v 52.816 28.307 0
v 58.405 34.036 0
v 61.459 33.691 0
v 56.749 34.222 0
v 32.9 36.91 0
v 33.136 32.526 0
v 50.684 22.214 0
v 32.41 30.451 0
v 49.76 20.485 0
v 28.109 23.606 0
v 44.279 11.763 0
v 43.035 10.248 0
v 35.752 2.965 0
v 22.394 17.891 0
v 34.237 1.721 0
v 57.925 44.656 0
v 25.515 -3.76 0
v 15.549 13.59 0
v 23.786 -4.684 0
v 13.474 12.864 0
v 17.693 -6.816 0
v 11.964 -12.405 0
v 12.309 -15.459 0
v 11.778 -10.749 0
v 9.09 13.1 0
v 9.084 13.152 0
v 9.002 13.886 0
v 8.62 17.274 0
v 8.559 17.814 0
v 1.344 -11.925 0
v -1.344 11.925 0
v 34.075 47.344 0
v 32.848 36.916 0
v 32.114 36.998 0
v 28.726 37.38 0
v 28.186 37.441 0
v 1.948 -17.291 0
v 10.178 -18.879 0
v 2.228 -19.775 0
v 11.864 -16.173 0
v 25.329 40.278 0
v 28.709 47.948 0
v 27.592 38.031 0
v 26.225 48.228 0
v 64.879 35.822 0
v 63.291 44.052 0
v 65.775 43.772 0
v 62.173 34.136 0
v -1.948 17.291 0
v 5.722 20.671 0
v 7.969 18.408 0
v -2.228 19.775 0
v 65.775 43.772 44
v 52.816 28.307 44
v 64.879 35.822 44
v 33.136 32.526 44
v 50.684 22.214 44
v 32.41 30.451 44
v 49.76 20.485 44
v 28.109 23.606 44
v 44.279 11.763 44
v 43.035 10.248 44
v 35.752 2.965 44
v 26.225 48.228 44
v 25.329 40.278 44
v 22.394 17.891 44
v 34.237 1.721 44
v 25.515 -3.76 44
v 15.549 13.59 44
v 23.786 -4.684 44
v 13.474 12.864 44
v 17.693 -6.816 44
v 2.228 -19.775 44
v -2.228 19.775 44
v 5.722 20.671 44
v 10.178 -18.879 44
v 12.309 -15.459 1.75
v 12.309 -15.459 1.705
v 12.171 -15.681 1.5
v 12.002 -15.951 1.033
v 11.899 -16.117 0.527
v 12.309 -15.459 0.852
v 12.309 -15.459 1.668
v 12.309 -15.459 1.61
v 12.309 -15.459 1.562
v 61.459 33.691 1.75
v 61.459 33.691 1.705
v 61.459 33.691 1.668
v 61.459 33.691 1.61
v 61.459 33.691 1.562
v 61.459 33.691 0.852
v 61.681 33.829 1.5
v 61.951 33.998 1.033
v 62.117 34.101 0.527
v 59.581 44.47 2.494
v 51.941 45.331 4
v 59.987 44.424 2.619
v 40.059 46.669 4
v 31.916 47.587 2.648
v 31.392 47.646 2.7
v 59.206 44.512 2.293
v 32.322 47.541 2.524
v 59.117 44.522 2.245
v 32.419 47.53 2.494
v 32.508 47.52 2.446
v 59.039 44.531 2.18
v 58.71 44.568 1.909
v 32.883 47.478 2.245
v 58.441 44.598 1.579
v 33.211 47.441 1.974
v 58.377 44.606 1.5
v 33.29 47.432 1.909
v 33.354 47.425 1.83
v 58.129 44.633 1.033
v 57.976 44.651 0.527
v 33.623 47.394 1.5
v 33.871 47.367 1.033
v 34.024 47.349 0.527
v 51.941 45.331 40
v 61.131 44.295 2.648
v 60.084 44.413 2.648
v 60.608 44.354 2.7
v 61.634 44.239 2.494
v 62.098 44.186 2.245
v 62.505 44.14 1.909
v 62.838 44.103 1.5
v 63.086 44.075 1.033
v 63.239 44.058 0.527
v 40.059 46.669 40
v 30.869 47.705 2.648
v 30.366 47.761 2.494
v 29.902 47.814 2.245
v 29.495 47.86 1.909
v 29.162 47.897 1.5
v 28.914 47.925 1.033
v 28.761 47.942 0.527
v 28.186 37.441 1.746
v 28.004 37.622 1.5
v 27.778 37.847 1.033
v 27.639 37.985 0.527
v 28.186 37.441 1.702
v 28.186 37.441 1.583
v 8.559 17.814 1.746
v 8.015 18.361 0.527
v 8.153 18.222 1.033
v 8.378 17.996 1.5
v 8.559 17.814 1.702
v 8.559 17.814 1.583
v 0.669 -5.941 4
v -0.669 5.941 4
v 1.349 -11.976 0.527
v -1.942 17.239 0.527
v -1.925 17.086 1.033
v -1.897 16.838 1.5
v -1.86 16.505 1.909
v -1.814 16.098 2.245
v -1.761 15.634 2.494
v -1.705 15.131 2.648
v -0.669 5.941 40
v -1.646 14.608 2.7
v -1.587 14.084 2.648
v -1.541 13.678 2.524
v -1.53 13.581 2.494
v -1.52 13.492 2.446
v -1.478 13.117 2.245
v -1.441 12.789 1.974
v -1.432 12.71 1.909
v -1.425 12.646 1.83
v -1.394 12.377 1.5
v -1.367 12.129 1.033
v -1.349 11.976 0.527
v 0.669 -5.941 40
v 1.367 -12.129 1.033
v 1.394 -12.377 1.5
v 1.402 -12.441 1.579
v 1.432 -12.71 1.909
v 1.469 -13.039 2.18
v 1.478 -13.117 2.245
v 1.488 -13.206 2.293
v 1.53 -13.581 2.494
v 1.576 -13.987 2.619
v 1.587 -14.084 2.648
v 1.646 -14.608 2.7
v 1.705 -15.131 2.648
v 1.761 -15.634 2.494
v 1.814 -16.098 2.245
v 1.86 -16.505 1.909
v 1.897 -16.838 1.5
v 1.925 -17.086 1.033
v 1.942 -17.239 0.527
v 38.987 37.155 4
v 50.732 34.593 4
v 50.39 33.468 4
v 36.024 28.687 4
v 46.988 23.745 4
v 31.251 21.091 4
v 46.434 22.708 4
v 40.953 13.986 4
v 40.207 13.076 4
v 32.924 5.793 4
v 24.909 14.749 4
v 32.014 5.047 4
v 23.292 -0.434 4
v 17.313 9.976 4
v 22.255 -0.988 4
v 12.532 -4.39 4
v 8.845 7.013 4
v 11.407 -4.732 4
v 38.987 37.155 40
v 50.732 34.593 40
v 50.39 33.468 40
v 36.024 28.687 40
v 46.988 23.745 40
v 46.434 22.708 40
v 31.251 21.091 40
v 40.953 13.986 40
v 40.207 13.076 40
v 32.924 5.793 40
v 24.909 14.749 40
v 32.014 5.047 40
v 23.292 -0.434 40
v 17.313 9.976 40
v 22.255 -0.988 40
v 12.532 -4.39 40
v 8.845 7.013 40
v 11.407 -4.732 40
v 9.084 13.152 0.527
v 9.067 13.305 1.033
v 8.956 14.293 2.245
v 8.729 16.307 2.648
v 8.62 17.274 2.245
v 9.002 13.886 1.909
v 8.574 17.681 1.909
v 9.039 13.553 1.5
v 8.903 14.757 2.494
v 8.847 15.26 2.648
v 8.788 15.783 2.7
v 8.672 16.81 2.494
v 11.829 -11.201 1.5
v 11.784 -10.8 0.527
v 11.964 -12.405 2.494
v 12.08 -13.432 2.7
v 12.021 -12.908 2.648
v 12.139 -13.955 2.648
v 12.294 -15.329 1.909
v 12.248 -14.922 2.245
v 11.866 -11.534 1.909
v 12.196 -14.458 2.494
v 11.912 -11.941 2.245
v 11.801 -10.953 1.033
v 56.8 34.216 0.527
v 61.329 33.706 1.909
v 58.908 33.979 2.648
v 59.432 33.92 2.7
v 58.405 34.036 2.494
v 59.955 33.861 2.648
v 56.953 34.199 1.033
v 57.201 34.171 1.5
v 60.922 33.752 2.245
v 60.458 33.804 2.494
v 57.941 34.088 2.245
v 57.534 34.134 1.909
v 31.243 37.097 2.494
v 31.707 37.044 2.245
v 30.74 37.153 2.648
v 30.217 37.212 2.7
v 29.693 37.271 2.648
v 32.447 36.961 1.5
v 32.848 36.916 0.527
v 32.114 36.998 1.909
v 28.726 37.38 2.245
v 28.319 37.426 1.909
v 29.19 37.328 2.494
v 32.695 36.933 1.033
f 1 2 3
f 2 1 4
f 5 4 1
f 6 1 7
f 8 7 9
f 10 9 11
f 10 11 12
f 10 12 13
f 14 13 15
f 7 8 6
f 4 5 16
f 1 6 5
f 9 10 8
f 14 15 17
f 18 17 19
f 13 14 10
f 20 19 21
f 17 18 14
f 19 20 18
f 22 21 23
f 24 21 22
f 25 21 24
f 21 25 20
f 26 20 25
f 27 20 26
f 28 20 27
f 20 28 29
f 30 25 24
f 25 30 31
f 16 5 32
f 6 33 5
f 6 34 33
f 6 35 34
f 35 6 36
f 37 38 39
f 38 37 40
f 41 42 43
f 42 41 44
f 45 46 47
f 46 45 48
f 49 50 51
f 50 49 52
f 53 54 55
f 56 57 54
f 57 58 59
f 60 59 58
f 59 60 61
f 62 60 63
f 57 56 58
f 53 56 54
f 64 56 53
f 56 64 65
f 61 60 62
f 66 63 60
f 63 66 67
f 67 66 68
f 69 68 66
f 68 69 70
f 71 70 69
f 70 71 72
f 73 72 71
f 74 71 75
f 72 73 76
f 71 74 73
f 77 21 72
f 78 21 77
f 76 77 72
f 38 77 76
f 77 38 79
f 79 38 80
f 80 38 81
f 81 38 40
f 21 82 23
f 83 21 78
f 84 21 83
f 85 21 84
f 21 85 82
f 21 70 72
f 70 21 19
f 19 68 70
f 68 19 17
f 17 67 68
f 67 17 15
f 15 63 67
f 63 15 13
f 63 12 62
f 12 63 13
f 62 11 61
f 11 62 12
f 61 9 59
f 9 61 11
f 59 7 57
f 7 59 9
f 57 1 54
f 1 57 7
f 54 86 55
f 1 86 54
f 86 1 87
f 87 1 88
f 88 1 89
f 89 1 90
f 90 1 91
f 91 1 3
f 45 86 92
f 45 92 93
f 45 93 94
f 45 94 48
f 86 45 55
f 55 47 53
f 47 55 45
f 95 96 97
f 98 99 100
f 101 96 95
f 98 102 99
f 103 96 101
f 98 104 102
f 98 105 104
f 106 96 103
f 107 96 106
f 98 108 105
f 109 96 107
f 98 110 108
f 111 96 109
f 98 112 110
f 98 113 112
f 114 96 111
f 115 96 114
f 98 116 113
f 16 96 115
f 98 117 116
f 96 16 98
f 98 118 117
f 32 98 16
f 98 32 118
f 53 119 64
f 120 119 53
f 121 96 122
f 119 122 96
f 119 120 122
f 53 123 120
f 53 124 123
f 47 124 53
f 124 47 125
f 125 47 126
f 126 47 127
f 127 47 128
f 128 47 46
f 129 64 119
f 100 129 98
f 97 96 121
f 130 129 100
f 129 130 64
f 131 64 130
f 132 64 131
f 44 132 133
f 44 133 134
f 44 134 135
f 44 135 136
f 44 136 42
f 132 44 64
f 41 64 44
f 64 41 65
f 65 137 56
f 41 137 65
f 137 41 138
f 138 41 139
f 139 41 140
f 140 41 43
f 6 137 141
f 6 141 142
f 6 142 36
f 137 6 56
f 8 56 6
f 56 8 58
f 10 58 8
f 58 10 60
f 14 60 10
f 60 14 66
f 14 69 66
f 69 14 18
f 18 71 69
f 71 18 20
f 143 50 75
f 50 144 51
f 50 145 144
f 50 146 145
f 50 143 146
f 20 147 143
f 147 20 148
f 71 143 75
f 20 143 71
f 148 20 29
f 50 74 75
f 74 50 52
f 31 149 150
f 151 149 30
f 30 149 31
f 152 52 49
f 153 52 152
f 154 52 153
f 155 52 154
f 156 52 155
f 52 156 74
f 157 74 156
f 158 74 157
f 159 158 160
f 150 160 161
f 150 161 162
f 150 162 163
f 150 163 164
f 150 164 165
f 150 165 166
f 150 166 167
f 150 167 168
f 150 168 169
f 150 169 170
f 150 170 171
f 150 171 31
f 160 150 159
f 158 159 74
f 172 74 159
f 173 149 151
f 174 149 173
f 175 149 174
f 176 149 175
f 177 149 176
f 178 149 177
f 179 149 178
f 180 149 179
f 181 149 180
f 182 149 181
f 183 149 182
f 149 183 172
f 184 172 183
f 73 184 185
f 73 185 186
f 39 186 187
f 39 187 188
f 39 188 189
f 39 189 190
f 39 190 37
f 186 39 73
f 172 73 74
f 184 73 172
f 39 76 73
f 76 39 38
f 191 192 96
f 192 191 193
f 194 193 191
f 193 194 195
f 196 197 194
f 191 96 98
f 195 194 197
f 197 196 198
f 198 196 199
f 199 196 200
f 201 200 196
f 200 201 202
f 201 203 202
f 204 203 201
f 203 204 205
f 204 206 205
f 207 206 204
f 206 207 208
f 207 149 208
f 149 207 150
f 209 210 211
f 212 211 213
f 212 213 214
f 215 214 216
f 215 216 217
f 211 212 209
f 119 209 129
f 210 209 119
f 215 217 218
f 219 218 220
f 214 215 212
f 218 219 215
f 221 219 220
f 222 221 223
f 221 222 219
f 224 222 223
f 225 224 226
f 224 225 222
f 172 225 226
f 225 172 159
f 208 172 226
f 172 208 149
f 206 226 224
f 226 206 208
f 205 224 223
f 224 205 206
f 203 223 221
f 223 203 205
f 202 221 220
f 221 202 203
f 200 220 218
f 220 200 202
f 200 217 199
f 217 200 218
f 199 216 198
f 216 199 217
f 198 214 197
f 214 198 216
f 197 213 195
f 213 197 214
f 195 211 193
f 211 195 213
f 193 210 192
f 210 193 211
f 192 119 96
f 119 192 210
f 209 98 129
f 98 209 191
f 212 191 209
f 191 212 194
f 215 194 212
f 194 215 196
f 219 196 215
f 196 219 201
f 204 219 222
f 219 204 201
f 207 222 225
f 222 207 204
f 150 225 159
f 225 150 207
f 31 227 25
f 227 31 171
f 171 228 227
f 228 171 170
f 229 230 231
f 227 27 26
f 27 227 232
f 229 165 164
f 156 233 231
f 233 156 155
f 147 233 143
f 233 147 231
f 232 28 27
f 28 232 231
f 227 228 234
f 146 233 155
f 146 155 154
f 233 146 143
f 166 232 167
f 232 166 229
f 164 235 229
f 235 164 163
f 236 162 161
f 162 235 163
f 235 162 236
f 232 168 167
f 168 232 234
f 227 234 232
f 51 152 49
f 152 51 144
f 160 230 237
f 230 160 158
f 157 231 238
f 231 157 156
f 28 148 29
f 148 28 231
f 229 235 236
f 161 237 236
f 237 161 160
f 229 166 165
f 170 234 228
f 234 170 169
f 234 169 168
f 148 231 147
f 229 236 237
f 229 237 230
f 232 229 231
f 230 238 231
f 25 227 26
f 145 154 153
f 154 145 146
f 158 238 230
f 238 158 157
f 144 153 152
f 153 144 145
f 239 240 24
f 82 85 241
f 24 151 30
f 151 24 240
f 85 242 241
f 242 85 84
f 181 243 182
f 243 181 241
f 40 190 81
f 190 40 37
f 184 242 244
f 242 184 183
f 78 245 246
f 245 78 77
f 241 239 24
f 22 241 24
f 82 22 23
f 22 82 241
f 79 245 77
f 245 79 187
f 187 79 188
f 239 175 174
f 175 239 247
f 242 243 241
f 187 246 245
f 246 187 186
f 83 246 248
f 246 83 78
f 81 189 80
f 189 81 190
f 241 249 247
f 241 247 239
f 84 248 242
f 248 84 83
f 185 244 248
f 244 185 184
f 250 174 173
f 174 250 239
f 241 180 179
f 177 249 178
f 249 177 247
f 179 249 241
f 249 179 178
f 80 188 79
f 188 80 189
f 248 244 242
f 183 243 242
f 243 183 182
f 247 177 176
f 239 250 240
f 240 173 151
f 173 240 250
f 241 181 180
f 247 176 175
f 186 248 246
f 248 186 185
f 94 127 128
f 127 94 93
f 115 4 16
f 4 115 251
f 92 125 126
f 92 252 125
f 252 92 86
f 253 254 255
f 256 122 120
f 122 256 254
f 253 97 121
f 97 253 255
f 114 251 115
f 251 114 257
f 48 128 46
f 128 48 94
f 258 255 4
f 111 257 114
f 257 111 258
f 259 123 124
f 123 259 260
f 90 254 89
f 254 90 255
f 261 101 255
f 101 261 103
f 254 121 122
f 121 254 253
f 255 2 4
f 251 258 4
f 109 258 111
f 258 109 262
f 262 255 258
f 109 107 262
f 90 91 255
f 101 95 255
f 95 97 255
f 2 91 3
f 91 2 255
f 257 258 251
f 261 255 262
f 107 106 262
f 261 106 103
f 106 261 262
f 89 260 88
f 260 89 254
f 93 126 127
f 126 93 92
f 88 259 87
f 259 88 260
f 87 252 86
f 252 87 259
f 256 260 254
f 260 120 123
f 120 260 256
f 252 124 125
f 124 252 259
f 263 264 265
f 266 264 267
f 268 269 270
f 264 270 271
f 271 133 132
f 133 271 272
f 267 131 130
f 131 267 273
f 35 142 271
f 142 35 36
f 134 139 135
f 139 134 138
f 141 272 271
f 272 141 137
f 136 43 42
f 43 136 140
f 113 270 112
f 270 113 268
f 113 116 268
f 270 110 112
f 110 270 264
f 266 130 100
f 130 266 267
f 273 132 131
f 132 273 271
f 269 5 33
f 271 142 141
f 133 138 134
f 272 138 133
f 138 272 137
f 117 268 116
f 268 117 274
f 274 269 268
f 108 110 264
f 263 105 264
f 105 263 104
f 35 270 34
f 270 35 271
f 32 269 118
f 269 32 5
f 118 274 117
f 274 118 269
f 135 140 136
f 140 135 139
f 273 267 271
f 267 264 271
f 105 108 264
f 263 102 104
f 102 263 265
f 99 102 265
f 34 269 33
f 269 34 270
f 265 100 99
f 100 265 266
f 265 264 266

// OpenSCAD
$fn = 32;

// ----------------------------------------------------------------------
// Air duct: 20 mm duct, 4 mm wall, 44 mm across
// ----------------------------------------------------------------------

// --- parameters (mm) ---
duct_r = 10;              // duct core radius
duct_d = 20;              // duct core diameter
wall = 4;                 // duct wall thickness
height = 44;              // duct width (extrusion height)
port_r = 19.9;            // port flange half width
port_d = 39.8;            // port flange width
port_t = 8;               // port flange thickness
bolt_d = 5.4;             // port bolt holes
bolt_offset = 14.7;       // bolt hole offset from the port axis

difference() {
  /* outer hull chain: tube with a flat flange plate at every port */
  linear_extrude(height = 44) {
    hull() {
      polygon([[2.228, -19.775], [-2.228, 19.775], [5.722, 20.671], [10.178, -18.879]]);
      translate([10.931, 1.232]) circle(r = 10);
    }
    hull() {
      translate([10.931, 1.232]) circle(r = 10);
      translate([10.236, 1.153]) circle(r = 10);
    }
    hull() {
      translate([10.236, 1.153]) circle(r = 10);
      translate([19.959, 4.555]) circle(r = 10);
    }
    hull() {
      translate([19.959, 4.555]) circle(r = 10);
      translate([28.681, 10.036]) circle(r = 10);
    }
    hull() {
      translate([28.681, 10.036]) circle(r = 10);
      translate([35.964, 17.319]) circle(r = 10);
    }
    hull() {
      translate([35.964, 17.319]) circle(r = 10);
      translate([41.445, 26.041]) circle(r = 10);
    }
    hull() {
      translate([41.445, 26.041]) circle(r = 10);
      translate([44.847, 35.764]) circle(r = 10);
    }
    hull() {
      translate([44.847, 35.764]) circle(r = 10);
      translate([44.768, 35.069]) circle(r = 10);
    }
    hull() {
      translate([44.768, 35.069]) circle(r = 10);
      polygon([[26.225, 48.228], [65.775, 43.772], [64.879, 35.822], [25.329, 40.278]]);
    }
  }
  /* air passage: the same chain inset by the wall, 5 mm proud of the ports */
  translate([0, 0, 4]) linear_extrude(height = 36) {
    hull() {
      translate([-4.969, -0.56]) circle(r = 6);
      translate([10.236, 1.153]) circle(r = 6);
    }
    hull() {
      translate([10.236, 1.153]) circle(r = 6);
      translate([19.959, 4.555]) circle(r = 6);
    }
    hull() {
      translate([19.959, 4.555]) circle(r = 6);
      translate([28.681, 10.036]) circle(r = 6);
    }
    hull() {
      translate([28.681, 10.036]) circle(r = 6);
      translate([35.964, 17.319]) circle(r = 6);
    }
    hull() {
      translate([35.964, 17.319]) circle(r = 6);
      translate([41.445, 26.041]) circle(r = 6);
    }
    hull() {
      translate([41.445, 26.041]) circle(r = 6);
      translate([44.847, 35.764]) circle(r = 6);
    }
    hull() {
      translate([44.847, 35.764]) circle(r = 6);
      translate([46.56, 50.969]) circle(r = 6);
    }
  }
  translate([0, 0]) rotate([0, 0, -83.57]) translate([-14.7, -2.5]) rotate([-90, 0, 0]) cylinder(h = 13, d = 5.4);
  translate([0, 0]) rotate([0, 0, -83.57]) translate([14.7, -2.5]) rotate([-90, 0, 0]) cylinder(h = 13, d = 5.4);
  translate([46, 46]) rotate([0, 0, 173.57]) translate([-14.7, -2.5]) rotate([-90, 0, 0]) cylinder(h = 13, d = 5.4);
  translate([46, 46]) rotate([0, 0, 173.57]) translate([14.7, -2.5]) rotate([-90, 0, 0]) cylinder(h = 13, d = 5.4);
}
